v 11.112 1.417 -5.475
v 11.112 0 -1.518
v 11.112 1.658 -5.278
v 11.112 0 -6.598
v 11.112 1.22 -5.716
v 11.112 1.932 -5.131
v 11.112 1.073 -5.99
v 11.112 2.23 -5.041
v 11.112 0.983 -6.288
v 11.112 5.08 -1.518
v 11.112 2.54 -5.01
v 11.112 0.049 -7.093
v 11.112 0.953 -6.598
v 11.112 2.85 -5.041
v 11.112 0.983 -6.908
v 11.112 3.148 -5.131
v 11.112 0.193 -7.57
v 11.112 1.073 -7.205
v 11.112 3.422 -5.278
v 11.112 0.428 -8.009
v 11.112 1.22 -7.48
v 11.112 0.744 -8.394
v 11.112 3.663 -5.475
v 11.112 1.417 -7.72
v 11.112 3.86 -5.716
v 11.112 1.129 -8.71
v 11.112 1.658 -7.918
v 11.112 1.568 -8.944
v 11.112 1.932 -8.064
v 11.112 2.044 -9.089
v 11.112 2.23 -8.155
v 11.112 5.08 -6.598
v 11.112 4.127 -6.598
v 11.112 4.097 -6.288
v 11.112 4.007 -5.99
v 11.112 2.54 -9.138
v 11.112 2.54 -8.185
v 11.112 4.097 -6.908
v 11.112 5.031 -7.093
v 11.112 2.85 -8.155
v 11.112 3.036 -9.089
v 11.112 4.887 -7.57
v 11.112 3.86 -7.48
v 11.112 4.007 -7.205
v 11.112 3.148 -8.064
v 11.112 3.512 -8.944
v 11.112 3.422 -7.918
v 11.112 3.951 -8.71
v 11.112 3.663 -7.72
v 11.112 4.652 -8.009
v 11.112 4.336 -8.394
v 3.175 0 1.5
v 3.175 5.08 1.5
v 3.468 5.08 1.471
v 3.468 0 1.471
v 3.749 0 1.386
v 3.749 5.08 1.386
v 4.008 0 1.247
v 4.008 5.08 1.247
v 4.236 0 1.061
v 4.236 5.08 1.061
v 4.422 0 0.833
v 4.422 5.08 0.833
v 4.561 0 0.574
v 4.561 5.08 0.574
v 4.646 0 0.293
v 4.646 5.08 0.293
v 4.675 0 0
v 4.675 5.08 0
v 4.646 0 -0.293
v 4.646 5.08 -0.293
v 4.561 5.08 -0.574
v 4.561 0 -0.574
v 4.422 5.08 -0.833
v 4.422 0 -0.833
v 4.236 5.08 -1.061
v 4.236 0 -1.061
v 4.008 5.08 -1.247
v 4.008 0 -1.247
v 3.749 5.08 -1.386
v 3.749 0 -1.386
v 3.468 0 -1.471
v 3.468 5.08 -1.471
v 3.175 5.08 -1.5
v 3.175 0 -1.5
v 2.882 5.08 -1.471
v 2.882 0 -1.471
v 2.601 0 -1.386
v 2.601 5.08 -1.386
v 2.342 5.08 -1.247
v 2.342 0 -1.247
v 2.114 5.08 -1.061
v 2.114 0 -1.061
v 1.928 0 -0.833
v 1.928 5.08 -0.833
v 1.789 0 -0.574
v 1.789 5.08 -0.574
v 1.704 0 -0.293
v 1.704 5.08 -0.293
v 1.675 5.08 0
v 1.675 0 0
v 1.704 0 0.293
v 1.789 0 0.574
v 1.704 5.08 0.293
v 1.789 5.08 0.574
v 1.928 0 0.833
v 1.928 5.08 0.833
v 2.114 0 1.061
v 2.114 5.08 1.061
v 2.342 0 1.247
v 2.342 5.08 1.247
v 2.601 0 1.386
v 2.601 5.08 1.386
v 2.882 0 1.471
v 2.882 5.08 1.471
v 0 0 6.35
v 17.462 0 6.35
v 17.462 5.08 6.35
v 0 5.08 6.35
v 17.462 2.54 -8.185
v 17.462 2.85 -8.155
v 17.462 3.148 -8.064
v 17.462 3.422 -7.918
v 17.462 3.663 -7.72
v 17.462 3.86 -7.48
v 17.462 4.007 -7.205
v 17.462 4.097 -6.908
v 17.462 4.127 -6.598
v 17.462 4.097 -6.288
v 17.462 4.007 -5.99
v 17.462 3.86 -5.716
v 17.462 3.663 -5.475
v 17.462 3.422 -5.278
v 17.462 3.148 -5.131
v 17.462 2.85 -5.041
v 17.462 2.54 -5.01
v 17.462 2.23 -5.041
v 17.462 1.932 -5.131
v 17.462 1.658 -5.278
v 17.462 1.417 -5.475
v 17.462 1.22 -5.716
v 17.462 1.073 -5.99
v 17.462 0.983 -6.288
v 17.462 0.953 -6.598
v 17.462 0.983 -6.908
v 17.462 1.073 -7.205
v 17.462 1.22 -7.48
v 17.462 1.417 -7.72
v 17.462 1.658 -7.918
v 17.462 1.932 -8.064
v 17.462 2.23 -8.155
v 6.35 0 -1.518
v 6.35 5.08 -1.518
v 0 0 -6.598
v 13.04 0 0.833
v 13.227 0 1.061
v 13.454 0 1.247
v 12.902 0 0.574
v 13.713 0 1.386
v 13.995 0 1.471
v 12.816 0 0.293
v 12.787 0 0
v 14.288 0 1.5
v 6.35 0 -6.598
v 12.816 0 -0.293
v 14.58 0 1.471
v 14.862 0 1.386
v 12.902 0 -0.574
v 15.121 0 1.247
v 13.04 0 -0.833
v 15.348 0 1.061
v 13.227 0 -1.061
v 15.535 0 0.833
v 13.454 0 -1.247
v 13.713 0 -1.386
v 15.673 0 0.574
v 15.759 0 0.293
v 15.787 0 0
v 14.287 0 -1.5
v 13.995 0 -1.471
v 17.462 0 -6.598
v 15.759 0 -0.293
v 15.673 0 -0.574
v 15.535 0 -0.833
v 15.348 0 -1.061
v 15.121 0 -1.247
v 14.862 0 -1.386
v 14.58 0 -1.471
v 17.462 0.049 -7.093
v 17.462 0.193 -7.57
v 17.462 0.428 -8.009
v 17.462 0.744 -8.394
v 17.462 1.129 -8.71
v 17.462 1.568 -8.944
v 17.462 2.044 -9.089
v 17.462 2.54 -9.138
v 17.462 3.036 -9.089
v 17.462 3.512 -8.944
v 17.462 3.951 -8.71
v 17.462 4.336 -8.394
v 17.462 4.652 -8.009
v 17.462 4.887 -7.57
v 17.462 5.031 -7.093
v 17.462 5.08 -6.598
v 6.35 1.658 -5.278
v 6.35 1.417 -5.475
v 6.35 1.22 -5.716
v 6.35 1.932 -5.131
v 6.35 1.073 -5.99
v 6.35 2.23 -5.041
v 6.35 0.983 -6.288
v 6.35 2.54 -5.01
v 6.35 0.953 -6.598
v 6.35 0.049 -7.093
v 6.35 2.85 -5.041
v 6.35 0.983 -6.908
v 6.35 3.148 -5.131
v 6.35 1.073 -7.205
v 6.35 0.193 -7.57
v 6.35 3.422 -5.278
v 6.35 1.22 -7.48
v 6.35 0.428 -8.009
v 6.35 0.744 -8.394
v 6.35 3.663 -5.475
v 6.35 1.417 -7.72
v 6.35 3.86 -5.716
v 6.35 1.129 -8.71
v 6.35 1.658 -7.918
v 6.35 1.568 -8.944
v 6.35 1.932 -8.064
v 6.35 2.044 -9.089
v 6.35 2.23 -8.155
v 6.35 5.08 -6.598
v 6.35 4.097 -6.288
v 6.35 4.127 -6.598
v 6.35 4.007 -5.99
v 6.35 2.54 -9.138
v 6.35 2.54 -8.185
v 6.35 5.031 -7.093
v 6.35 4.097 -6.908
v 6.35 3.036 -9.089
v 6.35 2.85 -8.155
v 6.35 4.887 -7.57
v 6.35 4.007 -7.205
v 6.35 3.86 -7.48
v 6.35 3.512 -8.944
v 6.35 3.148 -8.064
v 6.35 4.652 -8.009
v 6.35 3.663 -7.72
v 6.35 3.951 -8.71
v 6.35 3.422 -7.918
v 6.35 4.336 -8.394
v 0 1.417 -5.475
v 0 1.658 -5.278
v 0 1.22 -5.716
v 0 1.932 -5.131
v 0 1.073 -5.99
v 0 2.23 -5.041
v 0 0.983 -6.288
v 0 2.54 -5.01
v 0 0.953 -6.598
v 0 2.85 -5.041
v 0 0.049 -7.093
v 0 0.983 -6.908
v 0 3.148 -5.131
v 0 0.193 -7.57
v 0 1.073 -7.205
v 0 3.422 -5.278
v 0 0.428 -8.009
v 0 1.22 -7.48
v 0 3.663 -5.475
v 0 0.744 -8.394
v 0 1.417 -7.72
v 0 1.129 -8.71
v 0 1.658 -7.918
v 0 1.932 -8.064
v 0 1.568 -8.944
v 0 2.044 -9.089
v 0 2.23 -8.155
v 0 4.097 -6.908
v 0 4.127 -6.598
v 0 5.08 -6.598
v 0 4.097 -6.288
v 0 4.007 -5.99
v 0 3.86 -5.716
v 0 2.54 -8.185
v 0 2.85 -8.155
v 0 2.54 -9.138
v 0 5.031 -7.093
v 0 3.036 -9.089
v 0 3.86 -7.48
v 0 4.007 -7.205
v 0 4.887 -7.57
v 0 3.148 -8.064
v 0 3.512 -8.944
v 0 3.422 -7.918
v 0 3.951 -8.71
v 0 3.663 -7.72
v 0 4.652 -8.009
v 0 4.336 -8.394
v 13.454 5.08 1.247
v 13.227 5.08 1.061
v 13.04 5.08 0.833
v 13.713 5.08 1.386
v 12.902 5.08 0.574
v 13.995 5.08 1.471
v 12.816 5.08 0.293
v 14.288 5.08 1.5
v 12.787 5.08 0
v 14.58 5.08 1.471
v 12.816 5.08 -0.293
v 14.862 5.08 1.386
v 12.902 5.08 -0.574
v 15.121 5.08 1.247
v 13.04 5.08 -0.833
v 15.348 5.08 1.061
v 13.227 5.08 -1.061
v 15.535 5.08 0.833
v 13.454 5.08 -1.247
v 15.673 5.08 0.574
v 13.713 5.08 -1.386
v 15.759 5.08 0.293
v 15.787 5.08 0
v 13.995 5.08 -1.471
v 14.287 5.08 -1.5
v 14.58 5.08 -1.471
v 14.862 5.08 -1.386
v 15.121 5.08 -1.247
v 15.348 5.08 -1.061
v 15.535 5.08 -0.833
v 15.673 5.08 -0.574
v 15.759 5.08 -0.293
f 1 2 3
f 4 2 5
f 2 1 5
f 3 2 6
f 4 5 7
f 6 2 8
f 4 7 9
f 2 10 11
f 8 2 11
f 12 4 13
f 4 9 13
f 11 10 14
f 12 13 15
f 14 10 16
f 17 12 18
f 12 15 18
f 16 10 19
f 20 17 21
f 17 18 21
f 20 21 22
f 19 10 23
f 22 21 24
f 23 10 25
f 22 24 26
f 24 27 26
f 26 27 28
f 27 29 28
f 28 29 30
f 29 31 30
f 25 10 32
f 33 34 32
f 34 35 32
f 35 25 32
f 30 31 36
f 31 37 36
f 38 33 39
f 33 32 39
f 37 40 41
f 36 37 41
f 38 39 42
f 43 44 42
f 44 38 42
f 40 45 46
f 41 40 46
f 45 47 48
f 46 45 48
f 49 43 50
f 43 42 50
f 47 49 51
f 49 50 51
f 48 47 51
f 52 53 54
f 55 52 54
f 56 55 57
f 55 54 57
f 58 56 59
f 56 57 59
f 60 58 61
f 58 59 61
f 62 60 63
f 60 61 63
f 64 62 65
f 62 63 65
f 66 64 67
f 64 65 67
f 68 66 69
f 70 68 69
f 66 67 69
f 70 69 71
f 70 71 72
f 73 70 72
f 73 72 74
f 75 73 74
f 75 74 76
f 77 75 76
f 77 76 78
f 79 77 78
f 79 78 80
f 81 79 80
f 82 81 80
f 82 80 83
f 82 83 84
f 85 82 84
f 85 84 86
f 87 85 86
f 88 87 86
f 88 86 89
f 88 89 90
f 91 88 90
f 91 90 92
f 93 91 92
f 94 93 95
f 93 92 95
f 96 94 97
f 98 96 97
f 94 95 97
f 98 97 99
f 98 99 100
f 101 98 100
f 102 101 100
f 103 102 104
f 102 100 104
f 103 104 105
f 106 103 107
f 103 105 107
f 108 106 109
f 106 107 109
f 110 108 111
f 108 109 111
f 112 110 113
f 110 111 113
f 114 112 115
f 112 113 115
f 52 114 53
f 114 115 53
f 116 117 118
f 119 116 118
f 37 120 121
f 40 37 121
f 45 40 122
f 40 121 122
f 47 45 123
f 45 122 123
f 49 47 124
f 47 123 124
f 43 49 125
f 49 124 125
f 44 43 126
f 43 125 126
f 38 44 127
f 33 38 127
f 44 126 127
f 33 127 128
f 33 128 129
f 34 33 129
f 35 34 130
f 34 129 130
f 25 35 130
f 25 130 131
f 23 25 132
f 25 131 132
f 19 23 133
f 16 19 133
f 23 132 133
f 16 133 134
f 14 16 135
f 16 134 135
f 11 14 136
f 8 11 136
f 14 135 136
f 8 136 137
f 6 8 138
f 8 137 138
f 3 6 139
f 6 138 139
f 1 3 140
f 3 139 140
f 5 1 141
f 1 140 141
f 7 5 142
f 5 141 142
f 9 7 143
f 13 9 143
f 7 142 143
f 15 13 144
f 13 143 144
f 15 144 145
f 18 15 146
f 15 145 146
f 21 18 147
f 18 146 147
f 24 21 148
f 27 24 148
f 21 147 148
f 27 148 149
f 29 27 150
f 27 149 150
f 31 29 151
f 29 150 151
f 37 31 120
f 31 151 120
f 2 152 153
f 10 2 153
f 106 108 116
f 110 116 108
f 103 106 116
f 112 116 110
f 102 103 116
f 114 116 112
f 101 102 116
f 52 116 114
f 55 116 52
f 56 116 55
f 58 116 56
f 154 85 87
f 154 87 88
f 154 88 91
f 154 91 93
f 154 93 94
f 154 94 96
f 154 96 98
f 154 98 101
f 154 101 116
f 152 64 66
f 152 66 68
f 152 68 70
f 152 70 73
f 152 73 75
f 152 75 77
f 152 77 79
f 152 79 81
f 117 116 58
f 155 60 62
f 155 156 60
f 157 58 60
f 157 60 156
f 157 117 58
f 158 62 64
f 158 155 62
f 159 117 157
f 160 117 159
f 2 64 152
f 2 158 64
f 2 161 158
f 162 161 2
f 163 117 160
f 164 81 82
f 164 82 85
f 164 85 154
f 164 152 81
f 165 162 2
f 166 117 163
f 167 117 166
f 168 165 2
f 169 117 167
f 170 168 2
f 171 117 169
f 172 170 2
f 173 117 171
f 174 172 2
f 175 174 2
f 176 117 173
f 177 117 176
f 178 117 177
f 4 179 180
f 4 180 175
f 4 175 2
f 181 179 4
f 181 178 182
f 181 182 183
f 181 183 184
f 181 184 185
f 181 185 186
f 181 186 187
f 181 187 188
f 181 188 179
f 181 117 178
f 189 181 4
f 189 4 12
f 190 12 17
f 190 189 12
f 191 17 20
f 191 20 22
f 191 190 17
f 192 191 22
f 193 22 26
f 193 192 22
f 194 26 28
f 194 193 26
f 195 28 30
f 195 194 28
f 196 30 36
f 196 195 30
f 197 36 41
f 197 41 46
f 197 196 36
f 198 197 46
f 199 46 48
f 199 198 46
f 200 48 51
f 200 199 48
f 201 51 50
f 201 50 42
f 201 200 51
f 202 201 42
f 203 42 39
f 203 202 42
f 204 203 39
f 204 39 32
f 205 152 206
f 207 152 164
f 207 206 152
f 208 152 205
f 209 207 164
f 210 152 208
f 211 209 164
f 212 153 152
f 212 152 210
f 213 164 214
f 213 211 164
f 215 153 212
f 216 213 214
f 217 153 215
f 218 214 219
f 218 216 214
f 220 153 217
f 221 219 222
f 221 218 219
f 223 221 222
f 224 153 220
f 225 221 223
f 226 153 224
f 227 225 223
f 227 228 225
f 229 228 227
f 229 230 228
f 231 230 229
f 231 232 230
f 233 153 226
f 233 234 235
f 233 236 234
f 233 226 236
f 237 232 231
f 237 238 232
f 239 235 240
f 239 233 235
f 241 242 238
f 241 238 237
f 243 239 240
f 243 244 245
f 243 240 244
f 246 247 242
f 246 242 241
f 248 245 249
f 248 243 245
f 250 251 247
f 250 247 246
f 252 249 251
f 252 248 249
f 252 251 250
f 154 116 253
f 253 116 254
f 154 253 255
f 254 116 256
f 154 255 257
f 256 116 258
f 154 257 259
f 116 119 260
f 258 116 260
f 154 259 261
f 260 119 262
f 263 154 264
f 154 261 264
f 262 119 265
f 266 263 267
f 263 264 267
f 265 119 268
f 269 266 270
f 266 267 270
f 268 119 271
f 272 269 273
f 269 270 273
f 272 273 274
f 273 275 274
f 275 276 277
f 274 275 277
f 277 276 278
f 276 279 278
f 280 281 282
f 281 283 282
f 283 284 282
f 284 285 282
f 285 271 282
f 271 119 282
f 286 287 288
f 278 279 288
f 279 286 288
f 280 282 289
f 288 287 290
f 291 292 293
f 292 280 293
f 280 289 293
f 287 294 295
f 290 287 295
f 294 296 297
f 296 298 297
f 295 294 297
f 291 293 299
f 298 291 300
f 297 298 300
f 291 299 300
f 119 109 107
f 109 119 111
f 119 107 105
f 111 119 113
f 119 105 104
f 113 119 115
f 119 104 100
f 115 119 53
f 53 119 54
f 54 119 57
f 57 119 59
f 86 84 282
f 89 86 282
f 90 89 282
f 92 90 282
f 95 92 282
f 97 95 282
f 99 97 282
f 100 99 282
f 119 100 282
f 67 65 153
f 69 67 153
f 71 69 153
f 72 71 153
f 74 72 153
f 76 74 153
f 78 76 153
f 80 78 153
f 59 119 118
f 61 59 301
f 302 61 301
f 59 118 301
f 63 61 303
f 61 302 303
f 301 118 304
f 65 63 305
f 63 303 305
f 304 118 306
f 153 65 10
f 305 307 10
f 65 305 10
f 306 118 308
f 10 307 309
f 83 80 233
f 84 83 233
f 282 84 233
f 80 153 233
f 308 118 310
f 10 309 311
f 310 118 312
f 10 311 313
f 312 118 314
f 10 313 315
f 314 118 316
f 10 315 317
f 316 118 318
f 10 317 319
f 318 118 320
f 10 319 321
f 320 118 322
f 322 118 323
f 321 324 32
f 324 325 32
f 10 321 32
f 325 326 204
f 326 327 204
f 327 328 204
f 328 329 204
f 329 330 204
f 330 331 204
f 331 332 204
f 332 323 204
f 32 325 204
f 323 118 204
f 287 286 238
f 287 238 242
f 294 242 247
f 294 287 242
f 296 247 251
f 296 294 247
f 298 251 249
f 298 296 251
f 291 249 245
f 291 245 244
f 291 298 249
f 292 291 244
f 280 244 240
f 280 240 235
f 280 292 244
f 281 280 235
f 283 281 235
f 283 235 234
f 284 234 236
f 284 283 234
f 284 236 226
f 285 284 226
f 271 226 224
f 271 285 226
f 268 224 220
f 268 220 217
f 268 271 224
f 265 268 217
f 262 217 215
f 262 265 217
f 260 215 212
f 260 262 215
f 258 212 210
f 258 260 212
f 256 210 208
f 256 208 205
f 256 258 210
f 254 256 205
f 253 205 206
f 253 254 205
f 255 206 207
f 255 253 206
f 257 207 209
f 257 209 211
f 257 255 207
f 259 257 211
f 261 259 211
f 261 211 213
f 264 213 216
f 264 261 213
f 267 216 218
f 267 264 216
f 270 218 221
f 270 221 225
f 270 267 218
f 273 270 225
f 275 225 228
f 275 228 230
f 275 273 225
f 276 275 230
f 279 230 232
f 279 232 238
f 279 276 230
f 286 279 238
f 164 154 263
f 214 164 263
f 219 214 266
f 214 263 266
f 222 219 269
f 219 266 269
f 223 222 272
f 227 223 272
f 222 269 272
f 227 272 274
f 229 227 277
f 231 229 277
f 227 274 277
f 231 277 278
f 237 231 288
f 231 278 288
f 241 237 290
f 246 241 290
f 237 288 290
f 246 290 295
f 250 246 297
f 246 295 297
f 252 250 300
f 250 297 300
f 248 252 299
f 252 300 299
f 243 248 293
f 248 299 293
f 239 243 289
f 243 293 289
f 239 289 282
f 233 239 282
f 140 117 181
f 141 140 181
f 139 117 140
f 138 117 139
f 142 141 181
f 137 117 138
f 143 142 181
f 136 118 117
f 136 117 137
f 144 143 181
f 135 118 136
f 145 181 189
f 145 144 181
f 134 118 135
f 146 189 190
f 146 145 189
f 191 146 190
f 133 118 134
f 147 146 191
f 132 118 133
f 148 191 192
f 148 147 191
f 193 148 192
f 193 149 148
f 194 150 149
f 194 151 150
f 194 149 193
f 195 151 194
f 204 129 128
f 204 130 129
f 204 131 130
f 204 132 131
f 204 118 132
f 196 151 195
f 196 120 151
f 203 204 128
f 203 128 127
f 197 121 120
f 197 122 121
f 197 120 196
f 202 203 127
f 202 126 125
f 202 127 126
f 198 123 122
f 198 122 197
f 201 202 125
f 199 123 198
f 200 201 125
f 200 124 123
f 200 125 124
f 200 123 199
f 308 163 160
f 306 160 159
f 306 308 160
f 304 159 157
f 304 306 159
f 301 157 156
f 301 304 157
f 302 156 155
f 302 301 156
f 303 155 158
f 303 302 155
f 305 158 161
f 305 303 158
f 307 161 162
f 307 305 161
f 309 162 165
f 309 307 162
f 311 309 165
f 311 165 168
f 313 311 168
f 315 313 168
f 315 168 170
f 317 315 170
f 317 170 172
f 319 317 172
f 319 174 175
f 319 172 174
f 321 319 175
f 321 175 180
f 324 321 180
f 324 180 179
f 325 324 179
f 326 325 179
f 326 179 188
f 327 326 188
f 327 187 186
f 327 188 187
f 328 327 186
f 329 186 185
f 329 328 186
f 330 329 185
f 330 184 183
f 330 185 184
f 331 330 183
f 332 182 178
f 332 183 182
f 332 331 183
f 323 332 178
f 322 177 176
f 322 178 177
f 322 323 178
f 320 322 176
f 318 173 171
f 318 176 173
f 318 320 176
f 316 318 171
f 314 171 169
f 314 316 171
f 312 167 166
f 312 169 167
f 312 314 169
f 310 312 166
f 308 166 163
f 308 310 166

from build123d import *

# Parameters (mm, degrees)
SKETCH2_W           = 6.35
SKETCH2_H           = 5.08
SKETCH2_R           = 1.5875
BOSS_EXTRUDE1_DEPTH = 6.35
SKETCH3_R           = 1.5
CUT_EXTRUDE1_DEPTH  = 13.2322679
BOSS_EXTRUDE2_DEPTH = 4.7625


with BuildPart() as part:
    # Sketch2 → Boss-Extrude1 (new body)
    # profile 1 of 2: a face of its own
    with BuildSketch(Plane(origin=(0, 0, 0), x_dir=(0, 0, -1), z_dir=(1, 0, 0))):
        with Locations((-3.175, 2.54)):
            Rectangle(SKETCH2_W, SKETCH2_H)
    # profile 2 of 2: a face of its own
    with BuildSketch(Plane(origin=(0, 0, 0), x_dir=(0, 0, -1), z_dir=(1, 0, 0))):
        with BuildLine():
            Line((6.597804878, 5.08), (0, 5.08))
            Line((0, 5.08), (0, 0))
            Line((0, 0), (6.597804878, 0))
            ThreePointArc((6.597804878, 0), (9.137804878, 2.54), (6.597804878, 5.08))
        make_face()
        with Locations((6.597804878, 2.54)):
            Circle(SKETCH2_R, mode=Mode.SUBTRACT)
    boss_extrude1 = extrude(amount=BOSS_EXTRUDE1_DEPTH)

    # Sketch3 → Cut-Extrude1 (cut, through all)
    with BuildSketch(Plane(origin=(0, 5.08, 0), x_dir=(1, 0, 0), z_dir=(0, 1, 0))):
        with Locations(Location((3.175, 0, 0), (0, 0, 270))):
            Circle(SKETCH3_R)
    cut_extrude1 = extrude(amount=-CUT_EXTRUDE1_DEPTH, mode=Mode.SUBTRACT)

    # Sketch4 → Boss-Extrude2 (add)
    with BuildSketch(Plane(origin=(6.35, 0, 0), x_dir=(0, 0, -1), z_dir=(1, 0, 0))):
        Polygon((-6.35, 0), (1.517804878, 0), (1.517804878, 2.54), (1.517804878, 5.08), (-6.35, 5.08), align=None)
    extrude(amount=BOSS_EXTRUDE2_DEPTH)

    # Mirror1: Boss-Extrude1, Cut-Extrude1 across plane
    add(boss_extrude1.mirror(Plane(origin=(8.73125, 0, 0), x_dir=(0, 0, 1), z_dir=(1, 0, 0))))
    add(cut_extrude1.mirror(Plane(origin=(8.73125, 0, 0), x_dir=(0, 0, 1), z_dir=(1, 0, 0))), mode=Mode.SUBTRACT)


solid = part.part
